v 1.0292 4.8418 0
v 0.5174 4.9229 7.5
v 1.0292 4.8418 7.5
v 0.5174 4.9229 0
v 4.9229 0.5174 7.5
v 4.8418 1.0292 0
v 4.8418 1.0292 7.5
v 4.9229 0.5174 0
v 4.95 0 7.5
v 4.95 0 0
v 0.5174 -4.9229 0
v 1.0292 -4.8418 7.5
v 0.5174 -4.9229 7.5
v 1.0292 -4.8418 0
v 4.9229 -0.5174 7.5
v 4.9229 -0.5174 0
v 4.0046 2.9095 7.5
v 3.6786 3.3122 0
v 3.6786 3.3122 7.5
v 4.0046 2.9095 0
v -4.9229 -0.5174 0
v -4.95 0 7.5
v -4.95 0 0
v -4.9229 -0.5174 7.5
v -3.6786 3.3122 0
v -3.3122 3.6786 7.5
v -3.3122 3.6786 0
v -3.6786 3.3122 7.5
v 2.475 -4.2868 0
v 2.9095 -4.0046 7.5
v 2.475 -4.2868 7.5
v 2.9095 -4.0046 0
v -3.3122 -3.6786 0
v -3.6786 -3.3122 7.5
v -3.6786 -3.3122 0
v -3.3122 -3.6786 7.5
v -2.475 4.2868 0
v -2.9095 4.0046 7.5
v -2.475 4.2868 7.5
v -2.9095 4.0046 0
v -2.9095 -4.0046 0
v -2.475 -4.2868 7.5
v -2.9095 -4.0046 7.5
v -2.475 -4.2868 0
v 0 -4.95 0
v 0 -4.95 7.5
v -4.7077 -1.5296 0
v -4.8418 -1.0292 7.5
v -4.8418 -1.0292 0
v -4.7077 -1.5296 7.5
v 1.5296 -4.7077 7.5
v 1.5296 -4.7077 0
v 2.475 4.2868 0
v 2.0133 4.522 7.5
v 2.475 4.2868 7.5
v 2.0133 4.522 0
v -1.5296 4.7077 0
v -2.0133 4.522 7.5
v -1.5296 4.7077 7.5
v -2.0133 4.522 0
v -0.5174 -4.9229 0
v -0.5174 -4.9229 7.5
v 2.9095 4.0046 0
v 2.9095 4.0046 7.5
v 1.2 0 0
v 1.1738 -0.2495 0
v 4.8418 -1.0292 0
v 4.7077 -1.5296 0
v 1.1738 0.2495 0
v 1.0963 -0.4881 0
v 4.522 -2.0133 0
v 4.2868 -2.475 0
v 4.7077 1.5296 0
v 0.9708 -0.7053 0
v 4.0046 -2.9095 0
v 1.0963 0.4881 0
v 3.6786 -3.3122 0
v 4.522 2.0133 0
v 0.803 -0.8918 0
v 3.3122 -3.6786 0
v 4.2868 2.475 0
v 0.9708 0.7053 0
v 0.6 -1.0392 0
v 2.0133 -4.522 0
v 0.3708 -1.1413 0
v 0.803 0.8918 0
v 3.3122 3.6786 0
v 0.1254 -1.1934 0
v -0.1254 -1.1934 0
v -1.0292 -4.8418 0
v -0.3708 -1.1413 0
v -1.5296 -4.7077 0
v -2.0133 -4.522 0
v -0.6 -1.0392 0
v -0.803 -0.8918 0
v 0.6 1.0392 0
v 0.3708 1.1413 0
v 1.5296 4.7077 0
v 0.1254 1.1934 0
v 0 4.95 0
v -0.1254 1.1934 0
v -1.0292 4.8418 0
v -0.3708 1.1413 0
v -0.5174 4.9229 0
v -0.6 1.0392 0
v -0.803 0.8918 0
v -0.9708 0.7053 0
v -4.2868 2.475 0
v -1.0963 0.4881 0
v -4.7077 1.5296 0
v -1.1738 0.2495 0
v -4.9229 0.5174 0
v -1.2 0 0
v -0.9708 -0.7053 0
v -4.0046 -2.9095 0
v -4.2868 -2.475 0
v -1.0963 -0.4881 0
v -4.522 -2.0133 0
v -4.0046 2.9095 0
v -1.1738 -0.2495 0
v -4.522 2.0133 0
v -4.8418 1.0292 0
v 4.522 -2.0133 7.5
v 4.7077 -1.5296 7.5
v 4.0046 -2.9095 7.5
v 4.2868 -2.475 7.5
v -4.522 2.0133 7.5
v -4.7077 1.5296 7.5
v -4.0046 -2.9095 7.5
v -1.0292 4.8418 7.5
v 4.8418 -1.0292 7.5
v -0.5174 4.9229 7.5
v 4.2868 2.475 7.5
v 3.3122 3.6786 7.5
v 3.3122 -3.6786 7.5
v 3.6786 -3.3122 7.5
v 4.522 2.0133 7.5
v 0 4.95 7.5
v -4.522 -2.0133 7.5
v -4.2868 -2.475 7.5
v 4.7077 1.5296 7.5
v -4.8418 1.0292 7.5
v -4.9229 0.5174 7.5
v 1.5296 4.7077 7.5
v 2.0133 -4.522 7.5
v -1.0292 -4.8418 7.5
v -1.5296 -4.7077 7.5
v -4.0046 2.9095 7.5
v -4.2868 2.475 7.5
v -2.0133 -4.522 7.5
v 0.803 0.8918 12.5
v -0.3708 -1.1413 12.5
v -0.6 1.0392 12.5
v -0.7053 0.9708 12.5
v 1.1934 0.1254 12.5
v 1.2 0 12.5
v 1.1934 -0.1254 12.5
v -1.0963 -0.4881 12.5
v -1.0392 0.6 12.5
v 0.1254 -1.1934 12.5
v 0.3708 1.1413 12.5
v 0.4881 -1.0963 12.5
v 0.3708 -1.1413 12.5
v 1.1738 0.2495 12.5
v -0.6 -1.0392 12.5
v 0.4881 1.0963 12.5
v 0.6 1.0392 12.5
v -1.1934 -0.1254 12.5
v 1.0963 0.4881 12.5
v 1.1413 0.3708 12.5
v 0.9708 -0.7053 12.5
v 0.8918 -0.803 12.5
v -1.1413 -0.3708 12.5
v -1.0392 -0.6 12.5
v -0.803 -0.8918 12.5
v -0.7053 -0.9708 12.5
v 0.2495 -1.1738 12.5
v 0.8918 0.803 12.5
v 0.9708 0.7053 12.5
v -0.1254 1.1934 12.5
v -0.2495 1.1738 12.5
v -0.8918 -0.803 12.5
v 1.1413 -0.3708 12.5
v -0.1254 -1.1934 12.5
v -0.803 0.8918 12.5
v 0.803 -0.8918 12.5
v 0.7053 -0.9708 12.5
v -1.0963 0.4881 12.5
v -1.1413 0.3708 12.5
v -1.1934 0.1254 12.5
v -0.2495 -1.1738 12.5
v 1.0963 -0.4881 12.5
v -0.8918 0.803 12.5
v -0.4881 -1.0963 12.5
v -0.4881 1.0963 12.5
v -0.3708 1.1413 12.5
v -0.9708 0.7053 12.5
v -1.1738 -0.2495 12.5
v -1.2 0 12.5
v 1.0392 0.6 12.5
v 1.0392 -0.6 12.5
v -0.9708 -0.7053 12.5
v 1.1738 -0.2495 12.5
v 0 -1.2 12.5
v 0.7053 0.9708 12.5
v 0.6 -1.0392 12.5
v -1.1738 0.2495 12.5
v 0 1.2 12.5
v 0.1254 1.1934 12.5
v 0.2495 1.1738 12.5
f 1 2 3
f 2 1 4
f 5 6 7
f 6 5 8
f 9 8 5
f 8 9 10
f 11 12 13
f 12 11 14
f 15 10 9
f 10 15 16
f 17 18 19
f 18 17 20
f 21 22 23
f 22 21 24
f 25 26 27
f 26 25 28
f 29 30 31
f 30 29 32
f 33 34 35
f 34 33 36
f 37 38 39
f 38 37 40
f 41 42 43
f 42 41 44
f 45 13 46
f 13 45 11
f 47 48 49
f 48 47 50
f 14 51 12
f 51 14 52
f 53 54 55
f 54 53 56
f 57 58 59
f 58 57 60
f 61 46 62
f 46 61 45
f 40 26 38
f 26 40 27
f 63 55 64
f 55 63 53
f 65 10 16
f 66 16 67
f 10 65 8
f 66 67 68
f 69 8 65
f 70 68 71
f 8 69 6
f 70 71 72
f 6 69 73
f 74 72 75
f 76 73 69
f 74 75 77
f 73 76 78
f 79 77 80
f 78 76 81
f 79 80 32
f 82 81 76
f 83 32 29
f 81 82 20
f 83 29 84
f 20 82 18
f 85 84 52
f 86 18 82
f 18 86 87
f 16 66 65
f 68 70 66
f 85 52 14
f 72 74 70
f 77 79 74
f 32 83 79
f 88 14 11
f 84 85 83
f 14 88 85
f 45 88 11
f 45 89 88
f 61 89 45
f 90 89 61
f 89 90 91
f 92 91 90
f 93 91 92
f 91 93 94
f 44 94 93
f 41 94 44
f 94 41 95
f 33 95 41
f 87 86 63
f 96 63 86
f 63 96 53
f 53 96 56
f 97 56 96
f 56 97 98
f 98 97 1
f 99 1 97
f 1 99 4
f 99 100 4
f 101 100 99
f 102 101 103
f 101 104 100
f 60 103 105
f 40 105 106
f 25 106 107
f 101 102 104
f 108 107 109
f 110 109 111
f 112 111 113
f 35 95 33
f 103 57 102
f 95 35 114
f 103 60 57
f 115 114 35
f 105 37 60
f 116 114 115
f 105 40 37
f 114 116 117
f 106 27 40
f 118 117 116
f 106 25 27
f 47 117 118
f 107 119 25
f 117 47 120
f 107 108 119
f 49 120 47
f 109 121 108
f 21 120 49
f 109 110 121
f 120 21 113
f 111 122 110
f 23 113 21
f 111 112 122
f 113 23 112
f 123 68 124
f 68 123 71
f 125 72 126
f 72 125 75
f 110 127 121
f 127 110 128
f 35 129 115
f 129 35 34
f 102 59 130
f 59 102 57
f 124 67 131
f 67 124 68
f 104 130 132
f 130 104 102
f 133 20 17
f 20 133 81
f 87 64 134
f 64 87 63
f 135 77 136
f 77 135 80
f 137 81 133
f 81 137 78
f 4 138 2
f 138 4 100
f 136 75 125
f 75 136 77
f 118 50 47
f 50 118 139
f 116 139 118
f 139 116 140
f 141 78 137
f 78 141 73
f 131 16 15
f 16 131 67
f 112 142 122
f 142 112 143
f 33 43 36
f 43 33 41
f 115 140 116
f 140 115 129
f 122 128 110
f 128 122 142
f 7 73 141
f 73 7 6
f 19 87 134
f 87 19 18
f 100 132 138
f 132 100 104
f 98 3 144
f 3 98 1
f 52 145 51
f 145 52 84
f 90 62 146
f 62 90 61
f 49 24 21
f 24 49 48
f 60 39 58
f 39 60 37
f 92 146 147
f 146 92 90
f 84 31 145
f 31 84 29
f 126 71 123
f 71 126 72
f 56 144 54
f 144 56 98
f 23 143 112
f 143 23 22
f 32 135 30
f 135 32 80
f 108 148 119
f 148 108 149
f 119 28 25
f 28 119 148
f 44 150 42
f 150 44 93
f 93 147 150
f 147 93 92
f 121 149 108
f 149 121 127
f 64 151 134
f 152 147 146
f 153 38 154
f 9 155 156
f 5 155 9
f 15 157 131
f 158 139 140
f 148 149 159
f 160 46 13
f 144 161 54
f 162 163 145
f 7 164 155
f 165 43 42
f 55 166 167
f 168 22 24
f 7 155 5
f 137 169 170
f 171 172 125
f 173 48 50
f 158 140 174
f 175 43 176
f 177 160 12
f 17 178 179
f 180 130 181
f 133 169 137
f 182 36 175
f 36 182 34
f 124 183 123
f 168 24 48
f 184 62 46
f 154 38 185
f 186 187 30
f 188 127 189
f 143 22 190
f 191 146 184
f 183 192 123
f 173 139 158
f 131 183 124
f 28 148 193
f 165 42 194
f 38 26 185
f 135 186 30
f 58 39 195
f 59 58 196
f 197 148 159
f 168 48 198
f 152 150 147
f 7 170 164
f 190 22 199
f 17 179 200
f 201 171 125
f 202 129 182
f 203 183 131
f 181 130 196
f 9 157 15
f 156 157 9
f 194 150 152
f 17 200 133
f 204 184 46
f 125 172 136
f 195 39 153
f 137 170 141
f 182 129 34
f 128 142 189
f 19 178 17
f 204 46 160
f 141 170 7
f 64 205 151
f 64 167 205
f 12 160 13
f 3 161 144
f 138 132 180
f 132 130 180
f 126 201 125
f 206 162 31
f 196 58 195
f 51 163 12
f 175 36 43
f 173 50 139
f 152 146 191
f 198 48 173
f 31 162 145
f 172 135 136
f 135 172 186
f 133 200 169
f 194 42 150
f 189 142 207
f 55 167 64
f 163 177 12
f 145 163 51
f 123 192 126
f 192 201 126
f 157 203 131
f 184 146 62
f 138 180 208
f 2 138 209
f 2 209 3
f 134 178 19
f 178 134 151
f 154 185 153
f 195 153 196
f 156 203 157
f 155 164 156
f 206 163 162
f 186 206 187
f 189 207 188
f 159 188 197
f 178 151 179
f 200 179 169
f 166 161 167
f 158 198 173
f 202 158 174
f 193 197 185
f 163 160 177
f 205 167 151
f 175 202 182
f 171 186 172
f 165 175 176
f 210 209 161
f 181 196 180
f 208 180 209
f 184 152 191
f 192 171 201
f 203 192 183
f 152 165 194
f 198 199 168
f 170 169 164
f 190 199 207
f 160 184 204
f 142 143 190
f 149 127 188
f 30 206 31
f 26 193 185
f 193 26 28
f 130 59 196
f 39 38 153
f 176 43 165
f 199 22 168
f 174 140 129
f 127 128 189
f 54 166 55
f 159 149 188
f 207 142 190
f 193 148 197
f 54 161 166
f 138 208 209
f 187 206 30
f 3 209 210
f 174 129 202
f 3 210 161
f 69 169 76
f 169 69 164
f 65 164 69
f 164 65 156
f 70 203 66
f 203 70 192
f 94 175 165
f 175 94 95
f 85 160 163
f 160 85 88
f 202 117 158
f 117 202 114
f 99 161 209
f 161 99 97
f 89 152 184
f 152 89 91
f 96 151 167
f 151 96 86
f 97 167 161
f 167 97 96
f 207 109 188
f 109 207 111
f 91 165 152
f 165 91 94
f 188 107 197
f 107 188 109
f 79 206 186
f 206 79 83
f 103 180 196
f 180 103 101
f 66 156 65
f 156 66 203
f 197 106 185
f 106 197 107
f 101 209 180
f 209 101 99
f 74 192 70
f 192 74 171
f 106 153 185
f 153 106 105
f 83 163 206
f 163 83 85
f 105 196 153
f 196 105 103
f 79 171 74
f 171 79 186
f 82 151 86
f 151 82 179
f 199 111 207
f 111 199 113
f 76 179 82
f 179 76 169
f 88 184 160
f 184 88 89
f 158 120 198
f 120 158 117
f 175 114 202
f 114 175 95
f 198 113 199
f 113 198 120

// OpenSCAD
difference() {
    union() {
        cylinder(r=4.95,h=7.5,$fn=60);
        translate([0,0,7.5]) cylinder(r=4.95,r2=1.2,h=5,$fn=60);
    }
    translate([0,0,-1]) cylinder(r=1.2,h=19,$fn=30);
}
